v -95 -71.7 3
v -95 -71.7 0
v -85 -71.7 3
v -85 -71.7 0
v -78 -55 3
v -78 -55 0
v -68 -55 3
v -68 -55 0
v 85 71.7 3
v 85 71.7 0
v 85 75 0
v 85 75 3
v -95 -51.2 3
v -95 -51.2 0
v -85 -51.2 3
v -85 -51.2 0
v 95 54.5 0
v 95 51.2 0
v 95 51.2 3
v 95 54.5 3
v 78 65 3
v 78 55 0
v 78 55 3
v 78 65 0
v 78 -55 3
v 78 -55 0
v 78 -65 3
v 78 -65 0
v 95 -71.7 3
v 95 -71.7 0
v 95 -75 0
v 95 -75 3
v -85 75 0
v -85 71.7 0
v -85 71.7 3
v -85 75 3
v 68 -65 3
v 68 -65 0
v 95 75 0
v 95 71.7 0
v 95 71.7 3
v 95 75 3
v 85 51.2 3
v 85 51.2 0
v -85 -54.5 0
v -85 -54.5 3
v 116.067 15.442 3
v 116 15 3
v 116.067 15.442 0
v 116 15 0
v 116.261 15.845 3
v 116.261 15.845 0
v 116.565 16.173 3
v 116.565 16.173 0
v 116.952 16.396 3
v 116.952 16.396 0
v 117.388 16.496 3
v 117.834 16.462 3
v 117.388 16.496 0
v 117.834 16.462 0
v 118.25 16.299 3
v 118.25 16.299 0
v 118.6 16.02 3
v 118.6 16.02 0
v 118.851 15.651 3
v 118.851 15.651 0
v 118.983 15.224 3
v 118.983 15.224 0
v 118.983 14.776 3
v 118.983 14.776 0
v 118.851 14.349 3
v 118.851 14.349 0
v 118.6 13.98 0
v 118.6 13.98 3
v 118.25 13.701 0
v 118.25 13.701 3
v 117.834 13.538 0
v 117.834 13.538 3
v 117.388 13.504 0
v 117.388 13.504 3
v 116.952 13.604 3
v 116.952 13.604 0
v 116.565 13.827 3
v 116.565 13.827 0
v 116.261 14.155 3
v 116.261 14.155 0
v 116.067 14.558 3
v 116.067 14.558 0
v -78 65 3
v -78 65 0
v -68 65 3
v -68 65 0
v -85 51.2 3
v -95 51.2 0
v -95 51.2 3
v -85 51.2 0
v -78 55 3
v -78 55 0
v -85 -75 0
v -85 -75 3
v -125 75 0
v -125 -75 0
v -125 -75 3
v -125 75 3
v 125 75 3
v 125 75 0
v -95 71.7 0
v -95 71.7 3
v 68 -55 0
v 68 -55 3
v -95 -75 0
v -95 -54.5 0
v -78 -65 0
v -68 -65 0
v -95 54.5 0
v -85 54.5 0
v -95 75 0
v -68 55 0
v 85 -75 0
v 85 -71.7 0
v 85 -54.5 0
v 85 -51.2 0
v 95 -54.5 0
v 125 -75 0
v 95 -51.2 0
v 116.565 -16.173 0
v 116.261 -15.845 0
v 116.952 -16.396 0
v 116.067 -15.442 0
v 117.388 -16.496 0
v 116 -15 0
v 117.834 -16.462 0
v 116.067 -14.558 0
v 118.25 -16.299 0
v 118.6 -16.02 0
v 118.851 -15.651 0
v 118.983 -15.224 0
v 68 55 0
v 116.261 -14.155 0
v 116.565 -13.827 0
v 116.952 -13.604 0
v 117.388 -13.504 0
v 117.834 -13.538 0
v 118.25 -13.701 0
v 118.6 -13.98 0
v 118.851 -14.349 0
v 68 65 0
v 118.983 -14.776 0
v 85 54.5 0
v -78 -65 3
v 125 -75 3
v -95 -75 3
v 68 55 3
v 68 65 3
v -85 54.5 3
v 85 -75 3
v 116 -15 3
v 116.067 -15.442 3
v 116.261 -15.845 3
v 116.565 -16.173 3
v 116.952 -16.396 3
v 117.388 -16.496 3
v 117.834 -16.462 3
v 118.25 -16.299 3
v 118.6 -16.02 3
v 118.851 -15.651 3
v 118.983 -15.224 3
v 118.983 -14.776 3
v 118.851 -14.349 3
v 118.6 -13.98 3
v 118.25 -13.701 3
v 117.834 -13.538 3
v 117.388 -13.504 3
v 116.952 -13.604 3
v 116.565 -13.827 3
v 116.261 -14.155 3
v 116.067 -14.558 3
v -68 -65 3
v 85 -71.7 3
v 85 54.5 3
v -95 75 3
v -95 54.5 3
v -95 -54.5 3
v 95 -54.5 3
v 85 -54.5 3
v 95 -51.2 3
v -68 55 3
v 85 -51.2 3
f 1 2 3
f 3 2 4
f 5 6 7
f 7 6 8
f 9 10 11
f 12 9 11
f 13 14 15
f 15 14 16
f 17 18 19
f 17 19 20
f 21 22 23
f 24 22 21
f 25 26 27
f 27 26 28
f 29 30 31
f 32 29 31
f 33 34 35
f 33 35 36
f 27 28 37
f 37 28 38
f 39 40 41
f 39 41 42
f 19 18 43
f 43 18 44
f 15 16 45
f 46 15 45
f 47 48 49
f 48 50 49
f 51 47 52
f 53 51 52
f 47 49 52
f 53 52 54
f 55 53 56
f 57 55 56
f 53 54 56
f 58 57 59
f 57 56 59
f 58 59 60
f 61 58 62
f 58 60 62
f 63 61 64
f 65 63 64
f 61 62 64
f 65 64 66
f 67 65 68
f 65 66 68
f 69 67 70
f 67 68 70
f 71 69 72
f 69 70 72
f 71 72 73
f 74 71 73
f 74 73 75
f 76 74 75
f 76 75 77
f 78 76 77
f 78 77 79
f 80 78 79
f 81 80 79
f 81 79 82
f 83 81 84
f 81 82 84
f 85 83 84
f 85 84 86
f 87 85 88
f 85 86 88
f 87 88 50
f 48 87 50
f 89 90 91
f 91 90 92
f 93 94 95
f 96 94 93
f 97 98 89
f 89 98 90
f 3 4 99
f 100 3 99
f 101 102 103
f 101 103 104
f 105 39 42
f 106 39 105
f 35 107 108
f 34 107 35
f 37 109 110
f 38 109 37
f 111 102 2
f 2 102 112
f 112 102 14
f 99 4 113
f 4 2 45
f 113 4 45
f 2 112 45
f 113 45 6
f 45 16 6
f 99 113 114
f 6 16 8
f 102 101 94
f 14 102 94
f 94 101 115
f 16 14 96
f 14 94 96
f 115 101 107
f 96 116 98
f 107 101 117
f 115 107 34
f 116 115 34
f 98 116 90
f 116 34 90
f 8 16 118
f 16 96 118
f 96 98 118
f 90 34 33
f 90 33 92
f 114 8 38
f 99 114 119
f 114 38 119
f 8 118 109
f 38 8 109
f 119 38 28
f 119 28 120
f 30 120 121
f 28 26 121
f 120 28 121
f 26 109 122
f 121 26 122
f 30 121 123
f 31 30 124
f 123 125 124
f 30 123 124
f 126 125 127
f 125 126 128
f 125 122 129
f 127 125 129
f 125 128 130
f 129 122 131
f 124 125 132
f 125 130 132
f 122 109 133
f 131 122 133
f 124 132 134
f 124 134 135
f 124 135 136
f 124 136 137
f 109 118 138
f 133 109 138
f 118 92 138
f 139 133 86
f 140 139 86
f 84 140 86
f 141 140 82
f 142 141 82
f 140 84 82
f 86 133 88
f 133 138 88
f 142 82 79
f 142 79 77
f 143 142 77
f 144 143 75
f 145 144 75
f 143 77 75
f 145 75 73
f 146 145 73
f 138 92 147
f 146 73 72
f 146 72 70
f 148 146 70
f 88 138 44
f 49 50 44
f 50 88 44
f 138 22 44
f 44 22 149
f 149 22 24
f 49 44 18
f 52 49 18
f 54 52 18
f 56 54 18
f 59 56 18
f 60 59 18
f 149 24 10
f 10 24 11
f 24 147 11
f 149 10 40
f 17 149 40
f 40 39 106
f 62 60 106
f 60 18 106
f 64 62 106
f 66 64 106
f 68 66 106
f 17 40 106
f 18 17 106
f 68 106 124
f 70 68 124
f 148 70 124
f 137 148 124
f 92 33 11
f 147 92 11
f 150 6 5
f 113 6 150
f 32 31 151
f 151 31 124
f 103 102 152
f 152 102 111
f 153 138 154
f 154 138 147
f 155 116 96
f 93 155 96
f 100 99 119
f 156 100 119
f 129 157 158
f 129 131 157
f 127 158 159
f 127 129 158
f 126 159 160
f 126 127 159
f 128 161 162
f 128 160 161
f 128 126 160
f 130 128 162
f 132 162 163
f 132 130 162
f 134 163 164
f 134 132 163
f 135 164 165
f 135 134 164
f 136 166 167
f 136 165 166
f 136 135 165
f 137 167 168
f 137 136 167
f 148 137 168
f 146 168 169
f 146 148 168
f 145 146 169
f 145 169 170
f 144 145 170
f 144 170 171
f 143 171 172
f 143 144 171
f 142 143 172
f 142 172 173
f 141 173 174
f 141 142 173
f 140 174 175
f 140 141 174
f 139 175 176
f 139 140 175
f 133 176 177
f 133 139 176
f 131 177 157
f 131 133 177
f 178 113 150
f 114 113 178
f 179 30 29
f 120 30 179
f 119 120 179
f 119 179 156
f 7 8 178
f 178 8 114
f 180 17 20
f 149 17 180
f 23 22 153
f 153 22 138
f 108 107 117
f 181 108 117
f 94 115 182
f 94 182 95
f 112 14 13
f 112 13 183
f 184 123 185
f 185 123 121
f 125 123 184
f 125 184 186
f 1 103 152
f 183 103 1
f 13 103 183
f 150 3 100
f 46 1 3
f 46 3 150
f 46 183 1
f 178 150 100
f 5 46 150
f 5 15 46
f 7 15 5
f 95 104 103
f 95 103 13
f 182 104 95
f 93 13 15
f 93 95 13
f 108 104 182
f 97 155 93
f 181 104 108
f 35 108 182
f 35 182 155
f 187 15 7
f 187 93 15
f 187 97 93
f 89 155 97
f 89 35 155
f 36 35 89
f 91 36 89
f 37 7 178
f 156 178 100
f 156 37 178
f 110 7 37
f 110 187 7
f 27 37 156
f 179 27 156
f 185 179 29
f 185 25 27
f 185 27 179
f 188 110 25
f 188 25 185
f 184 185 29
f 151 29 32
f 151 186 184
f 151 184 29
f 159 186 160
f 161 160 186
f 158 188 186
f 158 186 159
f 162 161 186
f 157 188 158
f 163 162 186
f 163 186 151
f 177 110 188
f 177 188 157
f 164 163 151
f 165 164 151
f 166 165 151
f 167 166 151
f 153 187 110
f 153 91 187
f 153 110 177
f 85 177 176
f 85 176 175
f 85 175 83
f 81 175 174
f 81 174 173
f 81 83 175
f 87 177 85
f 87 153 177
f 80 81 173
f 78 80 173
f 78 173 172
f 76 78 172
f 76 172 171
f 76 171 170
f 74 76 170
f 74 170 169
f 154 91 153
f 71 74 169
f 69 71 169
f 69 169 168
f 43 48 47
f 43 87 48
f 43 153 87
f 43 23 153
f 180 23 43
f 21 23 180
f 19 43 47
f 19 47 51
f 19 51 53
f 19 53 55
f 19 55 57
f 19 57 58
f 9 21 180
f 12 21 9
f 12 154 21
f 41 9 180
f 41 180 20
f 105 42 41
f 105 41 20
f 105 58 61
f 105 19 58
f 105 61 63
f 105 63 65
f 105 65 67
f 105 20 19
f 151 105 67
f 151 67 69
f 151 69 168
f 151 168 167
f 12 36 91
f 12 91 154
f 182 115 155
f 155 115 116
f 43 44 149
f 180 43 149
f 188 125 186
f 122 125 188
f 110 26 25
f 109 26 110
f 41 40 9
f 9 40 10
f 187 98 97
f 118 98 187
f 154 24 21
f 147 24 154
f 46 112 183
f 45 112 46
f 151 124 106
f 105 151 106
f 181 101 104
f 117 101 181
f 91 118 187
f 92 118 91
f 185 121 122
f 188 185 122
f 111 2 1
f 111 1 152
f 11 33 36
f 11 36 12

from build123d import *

# Parameters (mm, degrees)
SKETCH2_W               = 250
SKETCH2_H               = 150
BOSS_EXTRUDE1_DEPTH     = 3
SKETCH3_W               = 10
SKETCH3_H               = 3.3
CUT_EXTRUDE1_DEPTH      = 146.804663849
LPATTERN1_COUNT         = 2
LPATTERN1_PITCH         = 20.5
SKETCH4_W               = 10
SKETCH4_H               = 10
CUT_EXTRUDE2_DEPTH      = 146.804663849
MIRROR1_COPY_1_SKETCH_W = 10
MIRROR1_COPY_1_SKETCH_H = 3.3
MIRROR1_COPY_1_DEPTH    = 146.804663849
MIRROR2_COPY_1_SKETCH_W = 10
MIRROR2_COPY_1_SKETCH_H = 3.3
MIRROR2_COPY_1_DEPTH    = 146.804663849
MIRROR2_COPY_2_SKETCH_W = 10
MIRROR2_COPY_2_SKETCH_H = 3.3
MIRROR2_COPY_2_DEPTH    = 146.804663849
MIRROR2_COPY_3_SKETCH_W = 10
MIRROR2_COPY_3_SKETCH_H = 10
MIRROR2_COPY_3_DEPTH    = 146.804663849
MIRROR2_COPY_4_SKETCH_W = 10
MIRROR2_COPY_4_SKETCH_H = 3.3
MIRROR2_COPY_4_DEPTH    = 146.804663849
SKETCH6_R               = 1.5
CUT_EXTRUDE4_DEPTH      = 146.804663849


with BuildPart() as part:
    # Sketch2 → Boss-Extrude1 (new body)
    with BuildSketch(Plane.XY):
        Rectangle(SKETCH2_W, SKETCH2_H)
    extrude(amount=BOSS_EXTRUDE1_DEPTH)

    # Sketch3 → Cut-Extrude1 (cut, symmetric)
    with BuildSketch(Plane(origin=(0, 0, 0), x_dir=(-1, 0, 0), z_dir=(0, 0, -1))):
        with Locations((-90, 73.35)):
            Rectangle(SKETCH3_W, SKETCH3_H)
    cut_extrude1 = extrude(amount=CUT_EXTRUDE1_DEPTH, both=True, mode=Mode.SUBTRACT)

    # LPattern1: Cut-Extrude1 ×2
    with Locations(*[(0, -i * LPATTERN1_PITCH, 0) for i in range(1, LPATTERN1_COUNT)]):
        add(cut_extrude1, mode=Mode.SUBTRACT)

    # Sketch4 → Cut-Extrude2 (cut, through all)
    with BuildSketch(Plane(origin=(0, 0, 0), x_dir=(-1, 0, 0), z_dir=(0, 0, -1))):
        with Locations((-73, 60)):
            Rectangle(SKETCH4_W, SKETCH4_H)
    cut_extrude2 = extrude(amount=-CUT_EXTRUDE2_DEPTH, mode=Mode.SUBTRACT)

    # Mirror1: Cut-Extrude1, Cut-Extrude2 across plane
    add(cut_extrude1.mirror(Plane.ZX), mode=Mode.SUBTRACT)
    add(cut_extrude2.mirror(Plane.ZX), mode=Mode.SUBTRACT)

    # Mirror1 copy 1 sketch → Mirror1 copy 1 (cut, symmetric)
    with BuildSketch(Plane(origin=(0, 20.5, 0), x_dir=(-1, 0, 0), z_dir=(0, 0, -1))):
        with Locations((-90, -73.35)):
            Rectangle(MIRROR1_COPY_1_SKETCH_W, MIRROR1_COPY_1_SKETCH_H)
    extrude(amount=MIRROR1_COPY_1_DEPTH, both=True, mode=Mode.SUBTRACT)

    # Mirror2: Cut-Extrude1, Cut-Extrude2 across plane
    add(cut_extrude1.mirror(Plane(origin=(0, 0, 0), x_dir=(0, 0, 1), z_dir=(1, 0, 0))), mode=Mode.SUBTRACT)
    add(cut_extrude2.mirror(Plane(origin=(0, 0, 0), x_dir=(0, 0, 1), z_dir=(1, 0, 0))), mode=Mode.SUBTRACT)

    # Mirror2 copy 1 sketch → Mirror2 copy 1 (cut, symmetric)
    with BuildSketch(Plane(origin=(0, -20.5, 0), x_dir=(1, 0, 0), z_dir=(0, 0, -1))):
        with Locations((-90, -73.35)):
            Rectangle(MIRROR2_COPY_1_SKETCH_W, MIRROR2_COPY_1_SKETCH_H)
    extrude(amount=MIRROR2_COPY_1_DEPTH, both=True, mode=Mode.SUBTRACT)

    # Mirror2 copy 2 sketch → Mirror2 copy 2 (cut, symmetric)
    with BuildSketch(Plane(origin=(0, 0, 0), x_dir=(1, 0, 0), z_dir=(0, 0, -1))):
        with Locations((-90, 73.35)):
            Rectangle(MIRROR2_COPY_2_SKETCH_W, MIRROR2_COPY_2_SKETCH_H)
    extrude(amount=MIRROR2_COPY_2_DEPTH, both=True, mode=Mode.SUBTRACT)

    # Mirror2 copy 3 sketch → Mirror2 copy 3 (cut, through all)
    with BuildSketch(Plane(origin=(0, 0, 0), x_dir=(1, 0, 0), z_dir=(0, 0, -1))):
        with Locations((-73, 60)):
            Rectangle(MIRROR2_COPY_3_SKETCH_W, MIRROR2_COPY_3_SKETCH_H)
    extrude(amount=-MIRROR2_COPY_3_DEPTH, mode=Mode.SUBTRACT)

    # Mirror2 copy 4 sketch → Mirror2 copy 4 (cut, symmetric)
    with BuildSketch(Plane(origin=(0, 20.5, 0), x_dir=(1, 0, 0), z_dir=(0, 0, -1))):
        with Locations((-90, 73.35)):
            Rectangle(MIRROR2_COPY_4_SKETCH_W, MIRROR2_COPY_4_SKETCH_H)
    extrude(amount=MIRROR2_COPY_4_DEPTH, both=True, mode=Mode.SUBTRACT)

    # Sketch6 → Cut-Extrude4 (cut, symmetric)
    with BuildSketch(Plane(origin=(0, 0, 0), x_dir=(-1, 0, 0), z_dir=(0, 0, -1))):
        with Locations((-117.5, 15)):
            Circle(SKETCH6_R)
    cut_extrude4 = extrude(amount=CUT_EXTRUDE4_DEPTH, both=True, mode=Mode.SUBTRACT)

    # Mirror3: Cut-Extrude4 across plane
    add(cut_extrude4.mirror(Plane.ZX), mode=Mode.SUBTRACT)


solid = part.part
